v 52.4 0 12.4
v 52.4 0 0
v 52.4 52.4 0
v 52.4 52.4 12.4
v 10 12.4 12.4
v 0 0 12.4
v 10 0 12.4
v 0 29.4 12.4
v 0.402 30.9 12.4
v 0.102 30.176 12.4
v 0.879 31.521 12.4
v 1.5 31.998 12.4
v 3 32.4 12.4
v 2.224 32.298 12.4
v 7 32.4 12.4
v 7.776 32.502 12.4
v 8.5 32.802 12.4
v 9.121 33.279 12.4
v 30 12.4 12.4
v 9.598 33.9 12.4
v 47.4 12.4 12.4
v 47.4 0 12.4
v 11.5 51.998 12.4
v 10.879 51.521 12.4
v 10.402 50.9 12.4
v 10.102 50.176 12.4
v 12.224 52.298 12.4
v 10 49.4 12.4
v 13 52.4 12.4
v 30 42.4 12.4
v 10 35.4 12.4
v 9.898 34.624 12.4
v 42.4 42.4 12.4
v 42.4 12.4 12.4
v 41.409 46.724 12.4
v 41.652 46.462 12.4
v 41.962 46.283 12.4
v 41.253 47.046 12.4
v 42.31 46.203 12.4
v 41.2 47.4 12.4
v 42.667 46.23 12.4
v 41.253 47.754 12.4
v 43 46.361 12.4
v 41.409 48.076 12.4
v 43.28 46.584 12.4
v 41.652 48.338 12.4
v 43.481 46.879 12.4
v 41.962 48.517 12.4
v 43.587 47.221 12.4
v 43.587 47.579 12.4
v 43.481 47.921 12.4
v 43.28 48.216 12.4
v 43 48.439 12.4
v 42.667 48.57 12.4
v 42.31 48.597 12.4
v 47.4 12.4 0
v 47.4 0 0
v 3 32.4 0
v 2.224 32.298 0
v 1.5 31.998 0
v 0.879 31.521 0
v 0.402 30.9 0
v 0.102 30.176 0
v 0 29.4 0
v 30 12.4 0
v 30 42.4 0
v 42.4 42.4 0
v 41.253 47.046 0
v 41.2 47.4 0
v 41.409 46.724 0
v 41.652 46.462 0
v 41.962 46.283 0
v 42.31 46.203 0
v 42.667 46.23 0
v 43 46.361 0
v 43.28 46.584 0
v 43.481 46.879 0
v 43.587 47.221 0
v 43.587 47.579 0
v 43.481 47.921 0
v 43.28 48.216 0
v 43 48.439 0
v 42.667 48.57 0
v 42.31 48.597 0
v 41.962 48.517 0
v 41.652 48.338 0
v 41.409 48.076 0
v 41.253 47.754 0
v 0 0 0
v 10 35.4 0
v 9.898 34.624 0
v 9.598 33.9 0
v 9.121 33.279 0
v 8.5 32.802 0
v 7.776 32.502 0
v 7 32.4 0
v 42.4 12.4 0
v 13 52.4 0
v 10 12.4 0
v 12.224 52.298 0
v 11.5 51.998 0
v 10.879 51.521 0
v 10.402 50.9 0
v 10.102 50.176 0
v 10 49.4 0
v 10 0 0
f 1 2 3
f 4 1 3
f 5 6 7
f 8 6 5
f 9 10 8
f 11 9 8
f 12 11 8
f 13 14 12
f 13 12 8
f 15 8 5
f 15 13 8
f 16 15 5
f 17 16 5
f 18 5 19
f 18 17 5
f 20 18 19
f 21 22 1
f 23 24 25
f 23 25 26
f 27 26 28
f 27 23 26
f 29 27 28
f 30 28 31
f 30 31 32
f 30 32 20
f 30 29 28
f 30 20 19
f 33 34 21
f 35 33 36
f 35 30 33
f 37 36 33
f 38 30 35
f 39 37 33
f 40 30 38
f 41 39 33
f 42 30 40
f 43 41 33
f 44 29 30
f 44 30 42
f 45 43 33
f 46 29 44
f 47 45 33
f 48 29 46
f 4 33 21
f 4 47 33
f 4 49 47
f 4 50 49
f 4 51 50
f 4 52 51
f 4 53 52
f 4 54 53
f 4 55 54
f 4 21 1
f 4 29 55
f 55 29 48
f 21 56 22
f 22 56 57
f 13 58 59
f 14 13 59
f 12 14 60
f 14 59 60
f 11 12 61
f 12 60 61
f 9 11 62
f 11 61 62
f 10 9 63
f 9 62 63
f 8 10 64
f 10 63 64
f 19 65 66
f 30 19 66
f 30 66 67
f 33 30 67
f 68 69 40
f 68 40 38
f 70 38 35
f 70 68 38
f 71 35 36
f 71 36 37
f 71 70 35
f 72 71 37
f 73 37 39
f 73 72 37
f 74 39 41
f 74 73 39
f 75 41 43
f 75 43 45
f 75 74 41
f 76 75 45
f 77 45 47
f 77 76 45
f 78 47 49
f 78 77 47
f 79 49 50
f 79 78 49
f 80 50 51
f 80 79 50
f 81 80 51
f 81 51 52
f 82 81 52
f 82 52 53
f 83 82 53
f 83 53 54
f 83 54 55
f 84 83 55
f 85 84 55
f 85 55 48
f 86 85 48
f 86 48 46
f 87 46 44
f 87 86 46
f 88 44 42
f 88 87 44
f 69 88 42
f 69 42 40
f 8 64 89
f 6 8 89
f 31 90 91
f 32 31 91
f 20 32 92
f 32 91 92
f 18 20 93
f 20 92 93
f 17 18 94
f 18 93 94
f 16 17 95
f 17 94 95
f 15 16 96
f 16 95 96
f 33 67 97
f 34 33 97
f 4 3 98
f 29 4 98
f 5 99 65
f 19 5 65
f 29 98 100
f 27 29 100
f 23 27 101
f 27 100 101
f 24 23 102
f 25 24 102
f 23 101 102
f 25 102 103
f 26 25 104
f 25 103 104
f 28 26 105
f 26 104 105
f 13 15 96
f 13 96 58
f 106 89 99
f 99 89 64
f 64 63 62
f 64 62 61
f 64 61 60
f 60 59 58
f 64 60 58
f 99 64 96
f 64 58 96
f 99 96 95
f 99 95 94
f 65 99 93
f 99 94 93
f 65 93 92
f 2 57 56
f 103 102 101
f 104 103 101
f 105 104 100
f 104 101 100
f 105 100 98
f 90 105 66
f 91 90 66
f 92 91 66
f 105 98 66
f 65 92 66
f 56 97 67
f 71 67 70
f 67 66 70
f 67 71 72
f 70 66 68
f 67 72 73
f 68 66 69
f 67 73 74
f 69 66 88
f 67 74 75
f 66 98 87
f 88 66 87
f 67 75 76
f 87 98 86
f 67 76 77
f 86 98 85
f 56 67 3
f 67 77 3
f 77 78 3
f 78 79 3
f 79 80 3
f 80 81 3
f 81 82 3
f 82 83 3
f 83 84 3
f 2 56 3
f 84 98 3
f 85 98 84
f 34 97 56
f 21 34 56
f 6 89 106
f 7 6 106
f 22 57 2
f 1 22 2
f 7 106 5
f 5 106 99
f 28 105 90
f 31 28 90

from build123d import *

# Parameters (mm, degrees)
MODEL_R             = 1.2
BOSS_EXTRUDE1_DEPTH = 12.4


with BuildPart() as part:
    # Model → Boss-Extrude1 (new body)
    with BuildSketch(Plane.XY):
        with BuildLine():
            Line((47.4, 0), (52.4, 0))
            Line((52.4, 0), (52.4, 52.4))
            Line((52.4, 52.4), (13, 52.4))
            ThreePointArc((13, 52.4), (10.878679656, 51.521320344), (10, 49.4))
            Line((10, 49.4), (10, 35.4))
            ThreePointArc((10, 35.4), (9.121320344, 33.278679656), (7, 32.4))
            Line((7, 32.4), (3, 32.4))
            ThreePointArc((3, 32.4), (0.878679656, 31.521320344), (0, 29.4))
            Line((0, 29.4), (0, 0))
            Line((0, 0), (10, 0))
            Line((10, 0), (10, 12.4))
            Line((10, 12.4), (30, 12.4))
            Line((30, 12.4), (30, 42.4))
            Line((30, 42.4), (42.4, 42.4))
            Line((42.4, 42.4), (42.4, 12.4))
            Line((42.4, 12.4), (47.4, 12.4))
            Line((47.4, 12.4), (47.4, 0))
        make_face()
        with Locations(Location((42.4, 47.4, 0), (0, 0, 180))):
            Circle(MODEL_R, mode=Mode.SUBTRACT)
    extrude(amount=BOSS_EXTRUDE1_DEPTH)


solid = part.part
